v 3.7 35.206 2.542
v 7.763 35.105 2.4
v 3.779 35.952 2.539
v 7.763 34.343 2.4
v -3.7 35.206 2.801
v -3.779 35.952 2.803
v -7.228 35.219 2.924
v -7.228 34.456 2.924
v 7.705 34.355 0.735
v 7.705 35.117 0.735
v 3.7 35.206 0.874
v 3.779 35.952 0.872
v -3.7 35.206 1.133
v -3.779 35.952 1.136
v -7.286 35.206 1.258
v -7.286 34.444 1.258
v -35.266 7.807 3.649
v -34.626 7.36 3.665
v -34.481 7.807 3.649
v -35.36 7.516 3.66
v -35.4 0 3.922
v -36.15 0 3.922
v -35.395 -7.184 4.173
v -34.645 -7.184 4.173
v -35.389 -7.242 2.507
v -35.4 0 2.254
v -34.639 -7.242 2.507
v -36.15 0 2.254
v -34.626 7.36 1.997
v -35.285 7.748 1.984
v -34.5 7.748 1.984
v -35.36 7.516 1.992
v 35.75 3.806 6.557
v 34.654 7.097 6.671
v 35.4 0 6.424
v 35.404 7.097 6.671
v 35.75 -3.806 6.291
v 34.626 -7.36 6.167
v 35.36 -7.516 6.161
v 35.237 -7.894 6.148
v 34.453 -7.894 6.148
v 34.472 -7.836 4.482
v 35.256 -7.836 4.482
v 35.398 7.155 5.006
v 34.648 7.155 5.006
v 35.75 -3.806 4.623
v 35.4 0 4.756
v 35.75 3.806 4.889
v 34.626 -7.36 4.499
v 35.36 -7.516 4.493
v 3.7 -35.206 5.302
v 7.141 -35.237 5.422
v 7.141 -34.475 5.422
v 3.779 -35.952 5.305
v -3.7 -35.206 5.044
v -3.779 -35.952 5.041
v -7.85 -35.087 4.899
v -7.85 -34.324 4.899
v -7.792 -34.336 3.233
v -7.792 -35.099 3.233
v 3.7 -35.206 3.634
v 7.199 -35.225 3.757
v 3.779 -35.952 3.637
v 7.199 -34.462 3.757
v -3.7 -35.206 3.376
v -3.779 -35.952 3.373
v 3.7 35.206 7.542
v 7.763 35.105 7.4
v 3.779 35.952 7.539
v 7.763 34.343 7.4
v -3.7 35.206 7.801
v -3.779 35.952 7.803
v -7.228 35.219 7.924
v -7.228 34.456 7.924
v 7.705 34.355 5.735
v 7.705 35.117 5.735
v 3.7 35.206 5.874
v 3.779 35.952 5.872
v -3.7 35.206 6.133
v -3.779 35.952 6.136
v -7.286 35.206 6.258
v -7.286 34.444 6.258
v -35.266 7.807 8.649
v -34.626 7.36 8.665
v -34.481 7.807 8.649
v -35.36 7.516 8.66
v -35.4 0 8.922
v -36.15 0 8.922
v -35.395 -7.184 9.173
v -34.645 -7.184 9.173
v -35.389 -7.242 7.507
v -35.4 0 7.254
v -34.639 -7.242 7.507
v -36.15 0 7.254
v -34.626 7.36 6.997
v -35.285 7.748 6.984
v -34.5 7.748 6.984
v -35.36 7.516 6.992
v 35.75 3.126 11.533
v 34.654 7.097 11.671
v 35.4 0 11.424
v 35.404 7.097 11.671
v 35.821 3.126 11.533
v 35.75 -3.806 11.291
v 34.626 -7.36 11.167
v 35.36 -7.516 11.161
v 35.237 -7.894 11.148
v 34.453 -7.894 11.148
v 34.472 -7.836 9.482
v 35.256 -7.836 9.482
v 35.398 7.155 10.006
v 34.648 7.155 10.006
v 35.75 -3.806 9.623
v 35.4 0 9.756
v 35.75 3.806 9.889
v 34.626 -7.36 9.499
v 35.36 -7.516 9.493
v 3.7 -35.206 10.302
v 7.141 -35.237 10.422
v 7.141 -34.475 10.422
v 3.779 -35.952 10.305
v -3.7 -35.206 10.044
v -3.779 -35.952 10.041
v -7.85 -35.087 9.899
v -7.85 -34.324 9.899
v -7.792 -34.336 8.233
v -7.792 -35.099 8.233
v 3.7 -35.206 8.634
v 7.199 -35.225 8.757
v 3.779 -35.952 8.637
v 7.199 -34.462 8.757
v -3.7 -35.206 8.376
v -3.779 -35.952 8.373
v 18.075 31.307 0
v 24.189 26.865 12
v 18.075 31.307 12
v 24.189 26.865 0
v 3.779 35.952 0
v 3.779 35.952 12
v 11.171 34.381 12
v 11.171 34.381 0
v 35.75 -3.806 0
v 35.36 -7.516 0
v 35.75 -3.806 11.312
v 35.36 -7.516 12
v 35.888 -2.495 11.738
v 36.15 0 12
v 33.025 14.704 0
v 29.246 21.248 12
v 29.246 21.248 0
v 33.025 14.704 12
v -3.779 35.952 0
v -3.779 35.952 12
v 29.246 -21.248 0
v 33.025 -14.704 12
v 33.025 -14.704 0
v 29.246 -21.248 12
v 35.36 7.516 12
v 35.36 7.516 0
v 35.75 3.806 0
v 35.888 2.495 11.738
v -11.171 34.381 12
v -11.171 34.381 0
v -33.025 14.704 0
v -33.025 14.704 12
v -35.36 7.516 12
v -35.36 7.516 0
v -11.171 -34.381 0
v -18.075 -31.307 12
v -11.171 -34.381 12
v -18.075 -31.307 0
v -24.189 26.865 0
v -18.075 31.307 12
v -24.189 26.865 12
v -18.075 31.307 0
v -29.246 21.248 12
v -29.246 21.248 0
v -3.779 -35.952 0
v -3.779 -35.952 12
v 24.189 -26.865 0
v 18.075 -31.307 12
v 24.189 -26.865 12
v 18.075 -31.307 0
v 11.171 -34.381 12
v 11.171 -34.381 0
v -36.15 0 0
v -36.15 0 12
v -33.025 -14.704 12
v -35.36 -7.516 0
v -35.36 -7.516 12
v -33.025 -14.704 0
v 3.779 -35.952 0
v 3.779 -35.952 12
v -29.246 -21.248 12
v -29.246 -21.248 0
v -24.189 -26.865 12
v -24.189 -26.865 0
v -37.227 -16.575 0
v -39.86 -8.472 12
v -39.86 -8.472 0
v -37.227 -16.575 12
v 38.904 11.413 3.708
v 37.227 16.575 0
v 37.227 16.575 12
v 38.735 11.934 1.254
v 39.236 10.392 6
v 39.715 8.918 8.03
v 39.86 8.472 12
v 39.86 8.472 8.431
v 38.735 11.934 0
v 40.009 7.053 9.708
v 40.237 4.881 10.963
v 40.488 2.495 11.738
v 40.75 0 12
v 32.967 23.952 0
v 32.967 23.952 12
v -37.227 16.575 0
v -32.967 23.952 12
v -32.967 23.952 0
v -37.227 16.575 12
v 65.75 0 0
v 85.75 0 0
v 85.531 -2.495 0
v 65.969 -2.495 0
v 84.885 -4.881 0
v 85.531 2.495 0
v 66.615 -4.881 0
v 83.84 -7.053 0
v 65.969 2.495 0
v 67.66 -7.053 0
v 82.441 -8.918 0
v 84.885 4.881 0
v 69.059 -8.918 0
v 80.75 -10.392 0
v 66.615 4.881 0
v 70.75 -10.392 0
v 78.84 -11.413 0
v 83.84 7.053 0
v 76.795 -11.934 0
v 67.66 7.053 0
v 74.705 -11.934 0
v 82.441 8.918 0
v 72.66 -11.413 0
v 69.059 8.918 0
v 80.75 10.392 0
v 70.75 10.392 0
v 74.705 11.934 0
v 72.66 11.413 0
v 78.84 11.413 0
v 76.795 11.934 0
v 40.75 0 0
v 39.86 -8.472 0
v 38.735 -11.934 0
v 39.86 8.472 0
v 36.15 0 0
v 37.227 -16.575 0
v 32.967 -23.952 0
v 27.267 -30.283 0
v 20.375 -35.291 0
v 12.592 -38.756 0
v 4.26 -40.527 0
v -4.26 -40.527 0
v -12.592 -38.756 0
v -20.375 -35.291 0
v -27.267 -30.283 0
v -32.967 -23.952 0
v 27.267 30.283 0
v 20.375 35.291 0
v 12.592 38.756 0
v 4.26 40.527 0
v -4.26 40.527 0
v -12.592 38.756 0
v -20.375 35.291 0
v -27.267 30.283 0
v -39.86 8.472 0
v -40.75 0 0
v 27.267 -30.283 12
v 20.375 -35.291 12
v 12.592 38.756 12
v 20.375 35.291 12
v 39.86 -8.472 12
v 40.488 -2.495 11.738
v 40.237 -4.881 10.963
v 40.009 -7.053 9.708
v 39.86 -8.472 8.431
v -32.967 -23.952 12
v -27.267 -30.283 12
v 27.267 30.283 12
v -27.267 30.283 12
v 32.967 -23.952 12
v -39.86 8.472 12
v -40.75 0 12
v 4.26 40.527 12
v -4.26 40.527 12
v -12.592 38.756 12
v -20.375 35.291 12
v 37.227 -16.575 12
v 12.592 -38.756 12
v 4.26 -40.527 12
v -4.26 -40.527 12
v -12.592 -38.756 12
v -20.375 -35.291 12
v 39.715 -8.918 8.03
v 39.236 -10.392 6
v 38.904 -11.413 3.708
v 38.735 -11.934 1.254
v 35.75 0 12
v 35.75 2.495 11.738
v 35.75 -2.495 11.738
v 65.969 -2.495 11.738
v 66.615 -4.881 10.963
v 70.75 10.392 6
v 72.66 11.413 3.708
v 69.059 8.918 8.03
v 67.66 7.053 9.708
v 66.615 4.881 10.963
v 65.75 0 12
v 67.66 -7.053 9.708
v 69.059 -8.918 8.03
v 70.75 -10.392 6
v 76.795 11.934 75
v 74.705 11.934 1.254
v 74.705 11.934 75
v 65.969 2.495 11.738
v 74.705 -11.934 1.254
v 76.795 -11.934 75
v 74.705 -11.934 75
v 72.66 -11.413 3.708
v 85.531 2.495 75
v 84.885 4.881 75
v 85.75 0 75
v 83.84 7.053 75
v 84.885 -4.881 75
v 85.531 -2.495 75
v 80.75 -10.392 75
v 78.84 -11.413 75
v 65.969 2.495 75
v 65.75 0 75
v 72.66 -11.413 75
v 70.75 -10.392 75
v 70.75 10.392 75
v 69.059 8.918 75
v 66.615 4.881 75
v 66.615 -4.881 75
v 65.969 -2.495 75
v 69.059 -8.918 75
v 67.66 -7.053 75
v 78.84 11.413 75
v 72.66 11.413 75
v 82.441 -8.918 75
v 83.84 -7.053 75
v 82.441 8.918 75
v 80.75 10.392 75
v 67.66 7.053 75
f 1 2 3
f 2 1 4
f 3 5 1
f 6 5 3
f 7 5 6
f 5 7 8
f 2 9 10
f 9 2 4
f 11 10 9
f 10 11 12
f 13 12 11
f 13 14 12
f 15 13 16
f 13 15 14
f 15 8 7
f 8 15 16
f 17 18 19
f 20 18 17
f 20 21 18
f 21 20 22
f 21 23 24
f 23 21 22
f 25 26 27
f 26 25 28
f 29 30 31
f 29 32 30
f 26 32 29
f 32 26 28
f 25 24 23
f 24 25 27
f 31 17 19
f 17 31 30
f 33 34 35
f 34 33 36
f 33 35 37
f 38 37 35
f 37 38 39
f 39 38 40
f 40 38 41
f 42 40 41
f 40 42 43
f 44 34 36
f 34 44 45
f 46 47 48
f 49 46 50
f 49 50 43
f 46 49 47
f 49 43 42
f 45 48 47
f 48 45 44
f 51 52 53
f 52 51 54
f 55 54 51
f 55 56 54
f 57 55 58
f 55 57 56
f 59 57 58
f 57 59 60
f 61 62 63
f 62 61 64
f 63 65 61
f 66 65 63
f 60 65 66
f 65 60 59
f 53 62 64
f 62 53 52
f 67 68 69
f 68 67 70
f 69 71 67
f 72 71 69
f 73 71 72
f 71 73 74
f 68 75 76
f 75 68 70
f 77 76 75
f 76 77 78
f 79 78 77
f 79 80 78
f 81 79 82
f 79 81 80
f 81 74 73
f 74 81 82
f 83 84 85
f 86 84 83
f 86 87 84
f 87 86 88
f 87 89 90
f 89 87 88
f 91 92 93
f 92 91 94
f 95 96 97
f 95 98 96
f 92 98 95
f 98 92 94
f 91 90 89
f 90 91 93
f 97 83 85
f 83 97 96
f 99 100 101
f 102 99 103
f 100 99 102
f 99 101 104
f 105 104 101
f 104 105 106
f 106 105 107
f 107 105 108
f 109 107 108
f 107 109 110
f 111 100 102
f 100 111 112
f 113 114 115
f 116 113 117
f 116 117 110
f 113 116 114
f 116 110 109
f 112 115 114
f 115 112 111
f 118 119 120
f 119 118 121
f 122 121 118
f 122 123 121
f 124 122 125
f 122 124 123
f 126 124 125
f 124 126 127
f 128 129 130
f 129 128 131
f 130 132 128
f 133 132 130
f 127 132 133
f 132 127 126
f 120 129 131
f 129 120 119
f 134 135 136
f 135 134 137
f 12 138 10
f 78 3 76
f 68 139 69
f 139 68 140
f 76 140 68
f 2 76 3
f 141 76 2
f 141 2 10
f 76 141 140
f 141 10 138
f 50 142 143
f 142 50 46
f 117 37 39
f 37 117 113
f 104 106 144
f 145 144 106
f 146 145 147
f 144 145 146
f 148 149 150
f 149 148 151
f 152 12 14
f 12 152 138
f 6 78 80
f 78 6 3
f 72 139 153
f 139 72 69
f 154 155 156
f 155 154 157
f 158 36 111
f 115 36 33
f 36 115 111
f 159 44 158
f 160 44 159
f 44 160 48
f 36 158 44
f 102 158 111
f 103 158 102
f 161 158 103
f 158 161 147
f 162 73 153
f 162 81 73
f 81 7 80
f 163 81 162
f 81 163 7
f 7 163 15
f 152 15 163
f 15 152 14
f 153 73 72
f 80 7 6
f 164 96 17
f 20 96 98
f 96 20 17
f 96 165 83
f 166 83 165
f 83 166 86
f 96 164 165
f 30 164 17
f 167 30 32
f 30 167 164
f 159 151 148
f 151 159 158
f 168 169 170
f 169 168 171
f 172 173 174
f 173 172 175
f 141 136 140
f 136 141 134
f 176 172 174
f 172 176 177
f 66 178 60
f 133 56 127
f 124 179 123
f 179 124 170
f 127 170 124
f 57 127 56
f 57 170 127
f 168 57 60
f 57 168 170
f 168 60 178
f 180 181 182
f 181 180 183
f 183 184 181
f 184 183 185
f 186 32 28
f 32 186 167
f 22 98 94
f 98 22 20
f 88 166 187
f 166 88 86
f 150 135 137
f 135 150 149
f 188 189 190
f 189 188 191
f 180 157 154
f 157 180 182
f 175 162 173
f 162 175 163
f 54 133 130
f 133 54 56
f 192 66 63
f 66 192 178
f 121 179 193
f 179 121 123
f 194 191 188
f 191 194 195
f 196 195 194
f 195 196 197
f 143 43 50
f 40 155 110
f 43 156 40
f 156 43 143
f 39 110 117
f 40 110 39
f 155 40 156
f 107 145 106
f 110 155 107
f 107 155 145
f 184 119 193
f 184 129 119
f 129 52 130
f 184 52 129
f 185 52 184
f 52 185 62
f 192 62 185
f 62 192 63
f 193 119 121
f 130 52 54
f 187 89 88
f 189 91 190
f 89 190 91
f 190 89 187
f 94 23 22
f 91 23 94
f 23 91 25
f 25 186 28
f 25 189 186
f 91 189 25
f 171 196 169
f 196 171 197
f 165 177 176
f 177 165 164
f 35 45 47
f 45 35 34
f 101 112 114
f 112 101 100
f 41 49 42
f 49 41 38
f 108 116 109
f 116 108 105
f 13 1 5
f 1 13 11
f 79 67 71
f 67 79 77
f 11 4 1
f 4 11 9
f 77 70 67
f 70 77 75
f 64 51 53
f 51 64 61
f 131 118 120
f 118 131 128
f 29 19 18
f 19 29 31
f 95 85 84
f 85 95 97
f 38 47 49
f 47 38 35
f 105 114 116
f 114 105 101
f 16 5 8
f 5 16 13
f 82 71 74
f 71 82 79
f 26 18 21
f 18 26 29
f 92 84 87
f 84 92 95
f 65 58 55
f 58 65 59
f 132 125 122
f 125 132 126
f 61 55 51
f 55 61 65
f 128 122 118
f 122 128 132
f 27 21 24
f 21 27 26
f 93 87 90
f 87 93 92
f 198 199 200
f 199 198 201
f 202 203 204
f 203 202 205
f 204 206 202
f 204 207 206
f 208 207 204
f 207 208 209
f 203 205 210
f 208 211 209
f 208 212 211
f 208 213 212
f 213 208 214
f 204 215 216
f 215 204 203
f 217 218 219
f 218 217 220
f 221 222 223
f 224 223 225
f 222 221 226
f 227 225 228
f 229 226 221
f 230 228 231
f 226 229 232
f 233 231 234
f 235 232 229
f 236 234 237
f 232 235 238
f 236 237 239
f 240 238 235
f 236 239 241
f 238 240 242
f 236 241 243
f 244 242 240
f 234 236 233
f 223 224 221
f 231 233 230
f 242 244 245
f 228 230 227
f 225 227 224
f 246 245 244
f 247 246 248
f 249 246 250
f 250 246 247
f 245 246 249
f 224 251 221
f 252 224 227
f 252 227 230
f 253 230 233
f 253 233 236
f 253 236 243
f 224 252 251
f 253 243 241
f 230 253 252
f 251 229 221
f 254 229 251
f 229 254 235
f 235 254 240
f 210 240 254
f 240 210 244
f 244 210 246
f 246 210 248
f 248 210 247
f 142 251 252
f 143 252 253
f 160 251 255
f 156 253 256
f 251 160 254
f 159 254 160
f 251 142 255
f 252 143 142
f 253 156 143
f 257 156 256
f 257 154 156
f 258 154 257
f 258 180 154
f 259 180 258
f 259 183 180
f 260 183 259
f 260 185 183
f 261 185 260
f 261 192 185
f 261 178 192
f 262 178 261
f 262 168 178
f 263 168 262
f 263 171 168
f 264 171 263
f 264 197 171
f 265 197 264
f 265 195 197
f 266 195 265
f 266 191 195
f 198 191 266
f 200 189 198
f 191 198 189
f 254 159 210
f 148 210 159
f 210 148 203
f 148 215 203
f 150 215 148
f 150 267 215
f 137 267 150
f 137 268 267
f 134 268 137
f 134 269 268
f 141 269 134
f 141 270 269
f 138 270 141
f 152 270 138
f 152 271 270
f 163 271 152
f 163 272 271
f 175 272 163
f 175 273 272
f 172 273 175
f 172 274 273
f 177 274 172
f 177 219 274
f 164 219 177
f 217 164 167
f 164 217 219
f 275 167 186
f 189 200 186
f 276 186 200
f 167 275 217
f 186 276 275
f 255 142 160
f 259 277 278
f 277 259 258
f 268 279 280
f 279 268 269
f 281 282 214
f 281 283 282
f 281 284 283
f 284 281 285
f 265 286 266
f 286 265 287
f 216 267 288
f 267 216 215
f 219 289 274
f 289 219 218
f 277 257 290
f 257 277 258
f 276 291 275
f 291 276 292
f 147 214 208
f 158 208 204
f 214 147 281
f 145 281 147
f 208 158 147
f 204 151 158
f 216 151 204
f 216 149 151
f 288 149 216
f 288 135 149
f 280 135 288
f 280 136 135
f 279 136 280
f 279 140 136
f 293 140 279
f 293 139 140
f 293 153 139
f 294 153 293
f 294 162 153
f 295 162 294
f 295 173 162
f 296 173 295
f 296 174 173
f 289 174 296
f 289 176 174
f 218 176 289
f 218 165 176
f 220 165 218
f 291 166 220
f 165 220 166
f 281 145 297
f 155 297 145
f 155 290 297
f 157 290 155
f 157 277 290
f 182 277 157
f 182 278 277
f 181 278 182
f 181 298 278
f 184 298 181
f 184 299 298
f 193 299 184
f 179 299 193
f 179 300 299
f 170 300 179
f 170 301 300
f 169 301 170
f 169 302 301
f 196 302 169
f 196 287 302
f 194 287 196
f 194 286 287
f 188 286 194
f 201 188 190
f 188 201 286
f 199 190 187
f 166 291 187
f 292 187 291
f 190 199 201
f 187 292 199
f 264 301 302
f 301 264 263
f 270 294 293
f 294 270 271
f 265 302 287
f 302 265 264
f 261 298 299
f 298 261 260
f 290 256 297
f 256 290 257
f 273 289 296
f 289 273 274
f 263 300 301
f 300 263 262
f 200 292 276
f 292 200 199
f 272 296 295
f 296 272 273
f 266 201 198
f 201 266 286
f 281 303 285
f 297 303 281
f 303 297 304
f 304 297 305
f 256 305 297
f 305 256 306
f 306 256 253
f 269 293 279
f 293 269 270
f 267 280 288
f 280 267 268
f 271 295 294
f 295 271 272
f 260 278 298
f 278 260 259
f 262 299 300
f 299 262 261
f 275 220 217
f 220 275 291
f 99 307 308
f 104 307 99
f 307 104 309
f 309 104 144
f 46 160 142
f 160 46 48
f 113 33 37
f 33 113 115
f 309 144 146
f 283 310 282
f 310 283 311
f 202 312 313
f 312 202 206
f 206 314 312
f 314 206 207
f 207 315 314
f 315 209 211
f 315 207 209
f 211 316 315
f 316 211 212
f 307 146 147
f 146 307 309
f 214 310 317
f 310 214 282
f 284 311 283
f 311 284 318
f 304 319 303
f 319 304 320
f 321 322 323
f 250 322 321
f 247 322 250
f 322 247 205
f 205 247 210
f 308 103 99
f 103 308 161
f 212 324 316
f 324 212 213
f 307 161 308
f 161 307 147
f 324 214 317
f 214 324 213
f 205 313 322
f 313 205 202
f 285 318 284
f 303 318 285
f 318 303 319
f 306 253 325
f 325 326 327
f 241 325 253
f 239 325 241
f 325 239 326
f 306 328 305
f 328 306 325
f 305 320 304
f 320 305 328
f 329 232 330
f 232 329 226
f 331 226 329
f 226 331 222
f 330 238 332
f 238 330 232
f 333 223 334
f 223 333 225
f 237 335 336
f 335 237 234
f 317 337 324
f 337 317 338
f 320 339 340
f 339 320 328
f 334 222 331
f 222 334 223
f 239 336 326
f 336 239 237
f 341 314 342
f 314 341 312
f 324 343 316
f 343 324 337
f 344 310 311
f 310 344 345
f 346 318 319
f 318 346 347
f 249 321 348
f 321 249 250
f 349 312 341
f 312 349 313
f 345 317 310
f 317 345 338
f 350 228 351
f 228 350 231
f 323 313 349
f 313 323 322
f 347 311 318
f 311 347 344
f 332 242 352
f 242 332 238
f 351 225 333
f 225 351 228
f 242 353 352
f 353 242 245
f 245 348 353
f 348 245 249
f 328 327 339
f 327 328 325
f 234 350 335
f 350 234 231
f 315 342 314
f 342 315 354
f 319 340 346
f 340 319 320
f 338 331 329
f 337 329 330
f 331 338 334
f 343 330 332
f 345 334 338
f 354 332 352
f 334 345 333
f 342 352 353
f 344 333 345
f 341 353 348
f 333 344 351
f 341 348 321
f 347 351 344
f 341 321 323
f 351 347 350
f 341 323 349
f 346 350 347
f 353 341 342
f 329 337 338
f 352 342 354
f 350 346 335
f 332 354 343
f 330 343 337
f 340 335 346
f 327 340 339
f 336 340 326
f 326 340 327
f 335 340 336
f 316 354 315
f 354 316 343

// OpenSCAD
// 2 Liter Bottle Holder
//
// (c) 2013 Laird Popkin, based on http://www.threadspecs.com/assets/Threadspecs/ISBT-PCO-1881-Finish-3784253-18.pdf.
// Credit to eagleapex for creating and then deleting http://www.thingiverse.com/thing:10489 
// which inspired me to create this.
//
// Respun to do http://www.thingiverse.com/thing:310961 parametrically.
//
// Screw onto jar until rim is tight against bead, and use as a mug.

// TO DO:
// - Add a label imprinted around the rim (your name, etc.)
// - Fit over bead (add bead measurement)
// = Add curve in so base of handle reaches jar? Adds another measurement

/* [Hidden] */

part="mug"; // "threads" for the part to print, "neck" for the part to subtract from your part
clearance=0.4; // tune to get the right 'fit' for your printer
jar = [[0,0,0,0],
	[25.07, 27.4, 2.7, 2, 15, 9],
	[70,70+.06*25,5,2,15,12],
	[86,86+.06*25,5,2,25,12]
	]; // 2 liter bottle

// http://en.wikipedia.org/wiki/Mason_jar

// regular mouth 2 3⁄8 in (60 mm) inner [2 3⁄4 in (70 mm) outer] diameter or 
// wide mouth 3 in (76 mm) inner [3 3⁄8 in (86 mm) outer] diameter

//standard narrow mouth canning jar:
//
//standard narrow mouth canning jar. It is 5tpi.
//The height of the 5 tpi thread is 0.060". The radius of the thread top is 0.044". The radius of the 
//base corner roots is 0.030" max. The sides of the threads are thirty degrees from vertical."

/* [Settings] */

// Pick jar size
jarNumber = 0; // [1:2 Liter bottle, 2:Narrow Canning, 3:Wide Canning, 0:Custom]
// Thickness of rim (mm)
rim = 5;
// Handle Length (mm)
handleLength = 75;
// Handle Thickness (mm)
handleThick = 20;
// Hand Space (between rim and handle)
handSpace = 25;

/* [Custom Jar] */

// Custom inner diameter (not including threads)
jarID = 70;
bottleID = jarNumber ? jar[jarNumber][0] : jarID;
echo(bottleID);
// Custom outer diameter (including threads)
jarOD=71.5;
bottleOD=jarNumber ? jar[jarNumber][1] : jarOD;
// Custom thread vertical spacing (mm)
jarPitch=5;
bottlePitch=jarNumber ? jar[jarNumber][2] : jarPitch;
// Custom angle of thread screws (degrees, 0 = level)
jarAngle=2;
bottleAngle=jarNumber ? jar[jarNumber][3] : jarAngle;
// Length of thread (mm)
jarThreadLen=15;
threadLen=jarNumber ? jar[jarNumber][4] : jarThreadLen;
// Height of rim around jar (mm) neasured from beat to top of mouth
rimHeight=12;
bottleHeight=jarNumber ? jar[jarNumber][5] : rimHeight;

echo(bottleID,bottleOD,bottlePitch,bottleAngle,threadLen,rimHeight);

/* [Holder] */


// holder params

holderOD=bottleOD+rim;
holderOR=holderOD/2;

/* [Hidden] */

// funnel params

funnelOD=100;
funnelWall=2;

// Bottle Computations

threadHeight = bottlePitch/3;
echo("thread height ",threadHeight);
echo("thread depth ",(bottleOD-bottleID)/2);

module bottleNeck() {
	difference() {
		union() {
			translate([0,0,-0.5]) cylinder(r=bottleOD/2+clearance,h=bottleHeight+1);
			}
		union() {
			rotate([0,bottleAngle,0]) translate([-threadLen/2,0,bottleHeight/2]) cube([threadLen,bottleOD,threadHeight]);
			rotate([0,bottleAngle,90]) translate([-threadLen/2,0,bottleHeight/2+bottlePitch/4]) cube([threadLen,bottleOD,threadHeight]);
			rotate([0,bottleAngle,-90]) translate([-threadLen/2,0,bottleHeight/2+bottlePitch*3/4]) cube([threadLen,bottleOD,threadHeight]);
			rotate([0,bottleAngle,180]) translate([-threadLen/2,0,bottleHeight/2+bottlePitch/2]) cube([threadLen,bottleOD,threadHeight]);
			translate([0,0,-bottlePitch]) {
				rotate([0,bottleAngle,0]) translate([-threadLen/2,0,bottleHeight/2]) cube([threadLen,bottleOD,threadHeight]);
				rotate([0,bottleAngle,90]) translate([-threadLen/2,0,bottleHeight/2+bottlePitch/4]) cube([threadLen,bottleOD,threadHeight]);
				rotate([0,bottleAngle,-90]) translate([-threadLen/2,0,bottleHeight/2+bottlePitch*3/4]) cube([threadLen,bottleOD,threadHeight]);
				rotate([0,bottleAngle,180]) translate([-threadLen/2,0,bottleHeight/2+bottlePitch/2]) cube([threadLen,bottleOD,threadHeight]);
				}
			//translate([0,0,bottleHeight/2+bottlePitch/2]) rotate([0,0,90]) cube([10,bottleOD,threadHeight], center=true);
			}
		}
	translate([0,0,-1]) cylinder(r=bottleID/2+clearance,h=bottleHeight+2);
	}

module bottleHolder() {
	difference() {
		cylinder(r=bottleOD/2+rim,h=bottleHeight);
		bottleNeck();
		}
	}

module bottleCap() {
	translate([0,0,1]) bottleHolder();
	cylinder(r=holderOR, h=1);
	}

module bottleMug() {
	bottleHolder();
	echo(bottleOD/2+rim+handSpace+handleThick);
	translate([bottleOD/2+rim+handSpace+handleThick/2,0,0]) scale([1,2*bottleHeight/handleThick,1]) cylinder(r=handleThick/2,h=handleLength);
	translate([bottleOD/2,0,0]) rotate([0,90,0]) difference() {
		cylinder(h=handSpace+rim+handleThick/2, r=bottleHeight);
		translate([0,-bottleHeight,0]) cube([bottleHeight,bottleHeight*2,handleLength]);
		}
	}

module funnel() {
	translate([0,0,bottleHeight]) difference() {
		difference() {
			cylinder(r=holderOR, h=funnelWall);
			translate([0,0,-.1]) cylinder(r=bottleID/2, h=funnelWall+.2);
			}
		}
	translate([0,0,bottleHeight+funnelWall]) difference() {
		cylinder(r1=holderOR,r2=funnelOD, h=funnelOD-bottleOD);
		translate([0,0,-.1]) cylinder(r1=bottleID/2,r2=funnelOD-funnelWall, h=funnelOD-bottleOD+.2);
		}
	bottleHolder();
	}

if (part=="threads") bottleHolder();;
if (part=="neck") bottleNeck();
if (part=="funnel") funnel();
if (part=="holder") bottleHolder();
if (part=="cap") bottleCap();
if (part=="mug") bottleMug();
